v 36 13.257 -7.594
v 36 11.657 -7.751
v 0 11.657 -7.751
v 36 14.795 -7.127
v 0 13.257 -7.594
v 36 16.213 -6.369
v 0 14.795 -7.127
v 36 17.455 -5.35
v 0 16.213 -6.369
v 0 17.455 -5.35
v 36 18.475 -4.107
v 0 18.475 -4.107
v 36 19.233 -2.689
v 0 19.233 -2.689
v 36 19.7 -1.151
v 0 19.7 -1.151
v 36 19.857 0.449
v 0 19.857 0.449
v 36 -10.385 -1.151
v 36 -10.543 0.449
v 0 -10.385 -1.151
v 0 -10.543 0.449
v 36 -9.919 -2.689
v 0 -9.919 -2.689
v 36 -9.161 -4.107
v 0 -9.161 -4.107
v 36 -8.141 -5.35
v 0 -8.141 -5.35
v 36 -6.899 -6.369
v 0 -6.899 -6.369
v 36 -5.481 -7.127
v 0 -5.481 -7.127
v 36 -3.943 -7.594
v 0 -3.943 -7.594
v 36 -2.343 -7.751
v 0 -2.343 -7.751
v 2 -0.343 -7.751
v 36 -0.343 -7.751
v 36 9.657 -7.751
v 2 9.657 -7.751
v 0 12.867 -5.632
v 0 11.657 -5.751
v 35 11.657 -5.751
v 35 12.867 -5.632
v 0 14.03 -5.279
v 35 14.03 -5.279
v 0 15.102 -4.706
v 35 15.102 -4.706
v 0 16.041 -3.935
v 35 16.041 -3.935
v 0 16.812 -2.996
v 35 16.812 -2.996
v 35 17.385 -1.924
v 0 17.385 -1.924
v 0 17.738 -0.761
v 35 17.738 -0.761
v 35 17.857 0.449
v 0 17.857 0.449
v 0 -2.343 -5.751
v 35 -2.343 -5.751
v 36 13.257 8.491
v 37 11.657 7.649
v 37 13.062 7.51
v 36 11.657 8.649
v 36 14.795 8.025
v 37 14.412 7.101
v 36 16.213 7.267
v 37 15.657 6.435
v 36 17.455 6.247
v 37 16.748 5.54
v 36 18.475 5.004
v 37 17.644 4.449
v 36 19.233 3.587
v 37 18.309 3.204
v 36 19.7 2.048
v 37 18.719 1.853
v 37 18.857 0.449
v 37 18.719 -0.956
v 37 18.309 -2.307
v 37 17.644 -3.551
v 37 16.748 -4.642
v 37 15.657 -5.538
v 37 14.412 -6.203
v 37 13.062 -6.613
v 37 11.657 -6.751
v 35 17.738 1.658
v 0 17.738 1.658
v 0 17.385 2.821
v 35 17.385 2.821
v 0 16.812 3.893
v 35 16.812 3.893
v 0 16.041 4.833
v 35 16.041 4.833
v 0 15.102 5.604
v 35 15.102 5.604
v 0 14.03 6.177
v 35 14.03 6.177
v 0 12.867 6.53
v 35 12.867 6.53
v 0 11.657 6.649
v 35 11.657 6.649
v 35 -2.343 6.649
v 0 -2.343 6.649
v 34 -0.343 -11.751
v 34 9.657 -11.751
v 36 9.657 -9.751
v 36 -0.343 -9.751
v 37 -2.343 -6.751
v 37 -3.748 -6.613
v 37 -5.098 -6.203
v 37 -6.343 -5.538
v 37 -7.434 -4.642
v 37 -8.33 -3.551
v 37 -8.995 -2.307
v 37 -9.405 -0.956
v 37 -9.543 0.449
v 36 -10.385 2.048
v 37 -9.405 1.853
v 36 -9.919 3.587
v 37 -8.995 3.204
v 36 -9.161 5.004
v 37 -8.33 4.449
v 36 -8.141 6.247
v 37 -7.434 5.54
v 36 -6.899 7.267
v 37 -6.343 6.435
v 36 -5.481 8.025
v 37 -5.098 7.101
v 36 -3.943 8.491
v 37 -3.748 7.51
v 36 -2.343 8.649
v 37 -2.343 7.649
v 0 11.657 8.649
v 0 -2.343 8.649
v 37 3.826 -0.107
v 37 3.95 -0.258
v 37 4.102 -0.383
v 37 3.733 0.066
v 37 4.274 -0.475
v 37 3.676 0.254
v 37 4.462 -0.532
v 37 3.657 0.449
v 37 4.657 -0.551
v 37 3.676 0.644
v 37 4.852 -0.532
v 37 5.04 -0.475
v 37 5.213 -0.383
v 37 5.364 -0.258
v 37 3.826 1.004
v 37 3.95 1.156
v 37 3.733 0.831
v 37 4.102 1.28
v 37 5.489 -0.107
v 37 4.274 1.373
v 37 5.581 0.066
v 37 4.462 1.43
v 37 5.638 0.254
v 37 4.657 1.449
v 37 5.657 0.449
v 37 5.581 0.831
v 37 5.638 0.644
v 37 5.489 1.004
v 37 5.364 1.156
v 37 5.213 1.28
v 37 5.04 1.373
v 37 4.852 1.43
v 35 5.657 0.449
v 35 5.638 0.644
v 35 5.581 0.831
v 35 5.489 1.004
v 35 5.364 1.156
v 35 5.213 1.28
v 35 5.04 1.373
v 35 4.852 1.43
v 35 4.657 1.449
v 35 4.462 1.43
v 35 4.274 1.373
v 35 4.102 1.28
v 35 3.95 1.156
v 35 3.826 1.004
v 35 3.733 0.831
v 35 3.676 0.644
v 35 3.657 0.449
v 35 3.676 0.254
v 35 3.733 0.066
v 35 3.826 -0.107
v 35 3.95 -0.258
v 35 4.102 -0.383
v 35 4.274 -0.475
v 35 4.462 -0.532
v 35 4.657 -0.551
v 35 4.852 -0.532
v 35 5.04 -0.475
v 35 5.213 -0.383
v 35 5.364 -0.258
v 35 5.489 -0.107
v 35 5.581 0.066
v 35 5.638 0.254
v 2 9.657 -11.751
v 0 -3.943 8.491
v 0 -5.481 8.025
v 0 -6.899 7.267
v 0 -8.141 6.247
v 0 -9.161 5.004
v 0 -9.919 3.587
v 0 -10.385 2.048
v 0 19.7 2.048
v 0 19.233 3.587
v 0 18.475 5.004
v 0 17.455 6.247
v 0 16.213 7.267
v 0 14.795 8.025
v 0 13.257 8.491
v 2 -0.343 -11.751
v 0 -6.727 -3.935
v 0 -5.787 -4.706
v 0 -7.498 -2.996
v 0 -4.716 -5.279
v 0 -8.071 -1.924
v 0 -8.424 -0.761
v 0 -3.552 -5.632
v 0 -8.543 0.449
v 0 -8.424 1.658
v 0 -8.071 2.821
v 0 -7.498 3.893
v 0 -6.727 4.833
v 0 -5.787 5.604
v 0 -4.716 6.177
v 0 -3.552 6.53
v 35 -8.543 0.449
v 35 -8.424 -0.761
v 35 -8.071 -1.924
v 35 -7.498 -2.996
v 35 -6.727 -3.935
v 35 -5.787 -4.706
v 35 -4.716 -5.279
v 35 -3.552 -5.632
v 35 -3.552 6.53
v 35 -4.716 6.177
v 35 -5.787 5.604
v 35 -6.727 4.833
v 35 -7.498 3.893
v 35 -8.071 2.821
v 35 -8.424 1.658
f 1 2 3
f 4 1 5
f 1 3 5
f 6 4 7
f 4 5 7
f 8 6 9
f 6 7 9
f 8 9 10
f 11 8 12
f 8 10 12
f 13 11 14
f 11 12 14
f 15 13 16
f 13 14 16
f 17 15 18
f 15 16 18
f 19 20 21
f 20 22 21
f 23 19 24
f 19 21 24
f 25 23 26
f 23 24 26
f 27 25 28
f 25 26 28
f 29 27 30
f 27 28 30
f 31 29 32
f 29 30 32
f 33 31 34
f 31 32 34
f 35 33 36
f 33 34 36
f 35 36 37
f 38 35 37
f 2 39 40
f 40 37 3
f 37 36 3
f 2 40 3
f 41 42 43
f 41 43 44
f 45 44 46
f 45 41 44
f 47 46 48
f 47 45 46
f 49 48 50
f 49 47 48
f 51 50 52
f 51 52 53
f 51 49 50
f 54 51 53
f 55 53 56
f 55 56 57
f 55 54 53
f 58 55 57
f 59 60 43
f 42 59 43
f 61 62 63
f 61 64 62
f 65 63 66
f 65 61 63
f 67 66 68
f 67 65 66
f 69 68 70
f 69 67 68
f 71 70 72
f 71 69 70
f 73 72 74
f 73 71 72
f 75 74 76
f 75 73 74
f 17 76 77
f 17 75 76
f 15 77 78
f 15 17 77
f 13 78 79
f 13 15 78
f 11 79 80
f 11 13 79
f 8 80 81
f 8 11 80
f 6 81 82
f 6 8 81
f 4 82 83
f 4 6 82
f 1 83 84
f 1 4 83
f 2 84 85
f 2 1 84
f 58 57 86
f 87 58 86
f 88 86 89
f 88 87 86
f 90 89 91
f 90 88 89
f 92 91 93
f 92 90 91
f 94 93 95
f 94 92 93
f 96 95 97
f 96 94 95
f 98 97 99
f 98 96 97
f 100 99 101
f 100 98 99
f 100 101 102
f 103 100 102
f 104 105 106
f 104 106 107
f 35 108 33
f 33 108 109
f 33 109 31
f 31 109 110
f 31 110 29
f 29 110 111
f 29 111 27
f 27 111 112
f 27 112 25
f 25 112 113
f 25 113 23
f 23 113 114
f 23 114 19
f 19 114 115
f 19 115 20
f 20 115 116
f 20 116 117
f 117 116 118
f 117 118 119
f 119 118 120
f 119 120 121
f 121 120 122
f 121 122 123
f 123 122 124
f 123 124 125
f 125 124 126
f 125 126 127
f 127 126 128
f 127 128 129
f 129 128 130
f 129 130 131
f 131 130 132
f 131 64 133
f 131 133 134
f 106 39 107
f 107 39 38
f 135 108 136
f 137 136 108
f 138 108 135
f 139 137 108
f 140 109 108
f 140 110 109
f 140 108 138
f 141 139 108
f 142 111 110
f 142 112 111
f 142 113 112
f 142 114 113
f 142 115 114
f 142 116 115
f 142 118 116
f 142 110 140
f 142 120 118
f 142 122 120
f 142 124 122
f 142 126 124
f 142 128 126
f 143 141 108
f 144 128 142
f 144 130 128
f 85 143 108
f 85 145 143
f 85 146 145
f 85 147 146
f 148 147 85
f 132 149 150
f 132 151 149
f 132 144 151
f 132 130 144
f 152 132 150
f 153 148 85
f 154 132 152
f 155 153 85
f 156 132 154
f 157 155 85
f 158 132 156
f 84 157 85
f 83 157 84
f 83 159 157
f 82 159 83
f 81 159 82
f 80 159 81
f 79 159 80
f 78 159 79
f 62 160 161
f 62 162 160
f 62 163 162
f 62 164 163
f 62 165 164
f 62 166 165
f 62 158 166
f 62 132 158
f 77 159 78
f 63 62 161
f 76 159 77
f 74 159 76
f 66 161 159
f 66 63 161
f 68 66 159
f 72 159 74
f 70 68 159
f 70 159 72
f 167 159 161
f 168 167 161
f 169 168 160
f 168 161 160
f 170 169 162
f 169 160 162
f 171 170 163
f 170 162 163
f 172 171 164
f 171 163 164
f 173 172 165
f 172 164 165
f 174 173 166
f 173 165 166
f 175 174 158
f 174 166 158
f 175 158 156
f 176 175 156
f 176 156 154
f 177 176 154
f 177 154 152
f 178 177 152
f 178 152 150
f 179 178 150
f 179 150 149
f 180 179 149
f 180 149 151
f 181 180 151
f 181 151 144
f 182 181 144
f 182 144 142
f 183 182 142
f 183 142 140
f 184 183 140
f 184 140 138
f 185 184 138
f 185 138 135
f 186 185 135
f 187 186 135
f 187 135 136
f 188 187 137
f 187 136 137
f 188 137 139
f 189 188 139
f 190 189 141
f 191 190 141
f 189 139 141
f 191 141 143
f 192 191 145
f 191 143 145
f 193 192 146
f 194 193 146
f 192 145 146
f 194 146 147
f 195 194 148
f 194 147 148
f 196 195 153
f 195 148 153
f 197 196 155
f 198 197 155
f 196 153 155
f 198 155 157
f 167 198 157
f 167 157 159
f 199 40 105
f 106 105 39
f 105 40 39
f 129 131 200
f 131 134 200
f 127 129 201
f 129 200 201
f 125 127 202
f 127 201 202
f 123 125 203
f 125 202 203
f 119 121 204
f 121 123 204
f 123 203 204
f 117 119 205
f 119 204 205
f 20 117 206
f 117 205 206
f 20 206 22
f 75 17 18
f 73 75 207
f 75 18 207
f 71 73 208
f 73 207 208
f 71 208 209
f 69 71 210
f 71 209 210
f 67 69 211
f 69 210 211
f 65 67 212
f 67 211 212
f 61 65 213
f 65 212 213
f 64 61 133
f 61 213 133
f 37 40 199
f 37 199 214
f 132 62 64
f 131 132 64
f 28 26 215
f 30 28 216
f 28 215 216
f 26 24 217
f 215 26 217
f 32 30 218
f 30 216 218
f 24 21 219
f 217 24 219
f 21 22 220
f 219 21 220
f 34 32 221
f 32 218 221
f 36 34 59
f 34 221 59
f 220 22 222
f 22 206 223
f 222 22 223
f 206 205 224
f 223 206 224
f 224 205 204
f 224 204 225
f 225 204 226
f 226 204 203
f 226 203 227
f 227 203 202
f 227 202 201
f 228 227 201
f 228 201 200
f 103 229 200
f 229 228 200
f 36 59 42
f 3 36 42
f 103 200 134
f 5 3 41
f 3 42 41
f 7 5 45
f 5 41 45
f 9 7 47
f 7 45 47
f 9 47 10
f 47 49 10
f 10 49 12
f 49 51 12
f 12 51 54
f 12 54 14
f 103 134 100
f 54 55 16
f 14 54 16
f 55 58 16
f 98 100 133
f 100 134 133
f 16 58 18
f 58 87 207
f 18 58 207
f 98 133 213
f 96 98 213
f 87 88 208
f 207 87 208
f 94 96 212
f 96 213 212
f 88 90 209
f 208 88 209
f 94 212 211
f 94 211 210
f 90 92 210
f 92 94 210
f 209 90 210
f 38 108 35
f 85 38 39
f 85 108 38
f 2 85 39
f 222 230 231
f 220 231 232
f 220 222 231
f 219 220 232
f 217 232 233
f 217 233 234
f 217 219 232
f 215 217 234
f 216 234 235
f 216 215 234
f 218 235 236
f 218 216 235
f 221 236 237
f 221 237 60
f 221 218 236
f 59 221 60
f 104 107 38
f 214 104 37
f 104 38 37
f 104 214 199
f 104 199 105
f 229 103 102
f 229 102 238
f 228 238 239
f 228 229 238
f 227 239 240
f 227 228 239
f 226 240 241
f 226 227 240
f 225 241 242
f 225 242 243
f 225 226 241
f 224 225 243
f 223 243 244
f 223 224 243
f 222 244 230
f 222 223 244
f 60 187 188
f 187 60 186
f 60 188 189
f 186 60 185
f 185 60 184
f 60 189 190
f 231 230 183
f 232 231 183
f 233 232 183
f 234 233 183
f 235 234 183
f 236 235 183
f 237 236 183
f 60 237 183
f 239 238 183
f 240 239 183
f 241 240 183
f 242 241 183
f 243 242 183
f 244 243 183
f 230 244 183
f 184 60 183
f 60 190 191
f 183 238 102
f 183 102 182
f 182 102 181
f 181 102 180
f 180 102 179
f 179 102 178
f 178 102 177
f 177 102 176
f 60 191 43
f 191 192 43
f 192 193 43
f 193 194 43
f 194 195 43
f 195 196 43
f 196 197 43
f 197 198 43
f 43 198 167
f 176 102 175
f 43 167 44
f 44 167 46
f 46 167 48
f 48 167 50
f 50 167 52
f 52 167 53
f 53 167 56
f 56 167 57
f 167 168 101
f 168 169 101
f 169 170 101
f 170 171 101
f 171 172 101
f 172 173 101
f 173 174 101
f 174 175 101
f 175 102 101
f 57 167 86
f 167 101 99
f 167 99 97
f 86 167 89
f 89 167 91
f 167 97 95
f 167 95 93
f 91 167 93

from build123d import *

# Parameters (mm, degrees)
F1_DEPTH    = 35
F2_T        = 2
F3_T1_DEPTH = 14
F3_T4_ANGLE = 180
F3_T6_ANGLE = 180
F4_R        = 1
F5_DEPTH    = 3
F6_W        = 1
F6_H        = 10
F6_W_2      = 33
F7_DEPTH    = 4
F8_SIZE     = 2


# Not quite as in the source:
# - a fillet or chamfer that OpenCascade refuses, or shapes differently, is made with other operations: its cross-section is extruded or revolved along the edge and cut away or added


with BuildPart() as f1:
    # F0 (on Right) → F1 (new body)
    with BuildSketch(Plane.YZ):
        with BuildLine():
            ThreePointArc((-8.5429217076, 0.448732347), (-6.726983751, -3.9353296963), (-2.3429217076, -5.751267653))
            Line((-2.3429217076, -5.751267653), (11.6570782924, -5.751267653))
            ThreePointArc((11.6570782924, -5.751267653), (16.0411403357, -3.9353296963), (17.8570782924, 0.448732347))
            ThreePointArc((17.8570782924, 0.448732347), (16.0411403357, 4.8327943904), (11.6570782924, 6.648732347))
            Line((11.6570782924, 6.648732347), (-2.3429217076, 6.648732347))
            ThreePointArc((-2.3429217076, 6.648732347), (-6.726983751, 4.8327943904), (-8.5429217076, 0.448732347))
        make_face()
    extrude(amount=F1_DEPTH)

    # F2
    f2_openings = [f1.faces().sort_by_distance(p)[0] for p in [
        (0, 4.657078, 0.448732),
    ]]
    offset(amount=F2_T, openings=f2_openings, kind=Kind.INTERSECTION)

    # F3: chamfer of 1 on 4 edges, made by hand

    # F3_s2 → F3_t1 (cut)
    with BuildSketch(Plane.XZ.offset(-11.6570782924)):
        Polygon((37, -6.751267653), (36, -7.751267653), (37, -7.751267653), align=None)
        Polygon((37, 7.648732347), (36, 8.648732347), (37, 8.648732347), align=None)
    extrude(amount=F3_T1_DEPTH, mode=Mode.SUBTRACT)

    # F3_s3 → F3_t4 (revolve, cut)
    with BuildSketch(Plane.XZ.offset(2.3429217076)):
        Polygon((36, -7.751267653), (37, -6.751267653), (37, -7.751267653), align=None)
    revolve(axis=Axis((37, -2.3429217076, 0.448732347), (-1, 0, 0)), revolution_arc=F3_T4_ANGLE, mode=Mode.SUBTRACT)

    # F3_s5 → F3_t6 (revolve, cut)
    with BuildSketch(Plane.XZ.offset(-11.6570782924)):
        Polygon((37, 7.648732347), (36, 8.648732347), (37, 8.648732347), align=None)
    revolve(axis=Axis((37, 11.6570782924, 0.448732347), (-1, 0, 0)), revolution_arc=F3_T6_ANGLE, mode=Mode.SUBTRACT)

    # F4 (on face) → F5 (cut)
    with BuildSketch(Plane.YZ.offset(37)):
        with Locations((4.6570782924, 0.448732347)):
            Circle(F4_R)
    extrude(amount=-F5_DEPTH, mode=Mode.SUBTRACT)

    # F6 (on face) → F7 (join)
    with BuildSketch(Plane(origin=(0, 0, -7.751267653), x_dir=(1, 0, 0), z_dir=(0, 0, -1))):
        with Locations((35.5, -4.6570782924)):
            Rectangle(F6_W, F6_H)
        with Locations((18.5, -4.6570782924)):
            Rectangle(F6_W_2, F6_H)
    extrude(amount=F7_DEPTH)

    # F8
    f8_edges = [f1.edges().sort_by_distance(p)[0] for p in [
        (36, 4.657078, -11.751268),
    ]]
    chamfer(f8_edges, length=F8_SIZE)


solid = f1.part
